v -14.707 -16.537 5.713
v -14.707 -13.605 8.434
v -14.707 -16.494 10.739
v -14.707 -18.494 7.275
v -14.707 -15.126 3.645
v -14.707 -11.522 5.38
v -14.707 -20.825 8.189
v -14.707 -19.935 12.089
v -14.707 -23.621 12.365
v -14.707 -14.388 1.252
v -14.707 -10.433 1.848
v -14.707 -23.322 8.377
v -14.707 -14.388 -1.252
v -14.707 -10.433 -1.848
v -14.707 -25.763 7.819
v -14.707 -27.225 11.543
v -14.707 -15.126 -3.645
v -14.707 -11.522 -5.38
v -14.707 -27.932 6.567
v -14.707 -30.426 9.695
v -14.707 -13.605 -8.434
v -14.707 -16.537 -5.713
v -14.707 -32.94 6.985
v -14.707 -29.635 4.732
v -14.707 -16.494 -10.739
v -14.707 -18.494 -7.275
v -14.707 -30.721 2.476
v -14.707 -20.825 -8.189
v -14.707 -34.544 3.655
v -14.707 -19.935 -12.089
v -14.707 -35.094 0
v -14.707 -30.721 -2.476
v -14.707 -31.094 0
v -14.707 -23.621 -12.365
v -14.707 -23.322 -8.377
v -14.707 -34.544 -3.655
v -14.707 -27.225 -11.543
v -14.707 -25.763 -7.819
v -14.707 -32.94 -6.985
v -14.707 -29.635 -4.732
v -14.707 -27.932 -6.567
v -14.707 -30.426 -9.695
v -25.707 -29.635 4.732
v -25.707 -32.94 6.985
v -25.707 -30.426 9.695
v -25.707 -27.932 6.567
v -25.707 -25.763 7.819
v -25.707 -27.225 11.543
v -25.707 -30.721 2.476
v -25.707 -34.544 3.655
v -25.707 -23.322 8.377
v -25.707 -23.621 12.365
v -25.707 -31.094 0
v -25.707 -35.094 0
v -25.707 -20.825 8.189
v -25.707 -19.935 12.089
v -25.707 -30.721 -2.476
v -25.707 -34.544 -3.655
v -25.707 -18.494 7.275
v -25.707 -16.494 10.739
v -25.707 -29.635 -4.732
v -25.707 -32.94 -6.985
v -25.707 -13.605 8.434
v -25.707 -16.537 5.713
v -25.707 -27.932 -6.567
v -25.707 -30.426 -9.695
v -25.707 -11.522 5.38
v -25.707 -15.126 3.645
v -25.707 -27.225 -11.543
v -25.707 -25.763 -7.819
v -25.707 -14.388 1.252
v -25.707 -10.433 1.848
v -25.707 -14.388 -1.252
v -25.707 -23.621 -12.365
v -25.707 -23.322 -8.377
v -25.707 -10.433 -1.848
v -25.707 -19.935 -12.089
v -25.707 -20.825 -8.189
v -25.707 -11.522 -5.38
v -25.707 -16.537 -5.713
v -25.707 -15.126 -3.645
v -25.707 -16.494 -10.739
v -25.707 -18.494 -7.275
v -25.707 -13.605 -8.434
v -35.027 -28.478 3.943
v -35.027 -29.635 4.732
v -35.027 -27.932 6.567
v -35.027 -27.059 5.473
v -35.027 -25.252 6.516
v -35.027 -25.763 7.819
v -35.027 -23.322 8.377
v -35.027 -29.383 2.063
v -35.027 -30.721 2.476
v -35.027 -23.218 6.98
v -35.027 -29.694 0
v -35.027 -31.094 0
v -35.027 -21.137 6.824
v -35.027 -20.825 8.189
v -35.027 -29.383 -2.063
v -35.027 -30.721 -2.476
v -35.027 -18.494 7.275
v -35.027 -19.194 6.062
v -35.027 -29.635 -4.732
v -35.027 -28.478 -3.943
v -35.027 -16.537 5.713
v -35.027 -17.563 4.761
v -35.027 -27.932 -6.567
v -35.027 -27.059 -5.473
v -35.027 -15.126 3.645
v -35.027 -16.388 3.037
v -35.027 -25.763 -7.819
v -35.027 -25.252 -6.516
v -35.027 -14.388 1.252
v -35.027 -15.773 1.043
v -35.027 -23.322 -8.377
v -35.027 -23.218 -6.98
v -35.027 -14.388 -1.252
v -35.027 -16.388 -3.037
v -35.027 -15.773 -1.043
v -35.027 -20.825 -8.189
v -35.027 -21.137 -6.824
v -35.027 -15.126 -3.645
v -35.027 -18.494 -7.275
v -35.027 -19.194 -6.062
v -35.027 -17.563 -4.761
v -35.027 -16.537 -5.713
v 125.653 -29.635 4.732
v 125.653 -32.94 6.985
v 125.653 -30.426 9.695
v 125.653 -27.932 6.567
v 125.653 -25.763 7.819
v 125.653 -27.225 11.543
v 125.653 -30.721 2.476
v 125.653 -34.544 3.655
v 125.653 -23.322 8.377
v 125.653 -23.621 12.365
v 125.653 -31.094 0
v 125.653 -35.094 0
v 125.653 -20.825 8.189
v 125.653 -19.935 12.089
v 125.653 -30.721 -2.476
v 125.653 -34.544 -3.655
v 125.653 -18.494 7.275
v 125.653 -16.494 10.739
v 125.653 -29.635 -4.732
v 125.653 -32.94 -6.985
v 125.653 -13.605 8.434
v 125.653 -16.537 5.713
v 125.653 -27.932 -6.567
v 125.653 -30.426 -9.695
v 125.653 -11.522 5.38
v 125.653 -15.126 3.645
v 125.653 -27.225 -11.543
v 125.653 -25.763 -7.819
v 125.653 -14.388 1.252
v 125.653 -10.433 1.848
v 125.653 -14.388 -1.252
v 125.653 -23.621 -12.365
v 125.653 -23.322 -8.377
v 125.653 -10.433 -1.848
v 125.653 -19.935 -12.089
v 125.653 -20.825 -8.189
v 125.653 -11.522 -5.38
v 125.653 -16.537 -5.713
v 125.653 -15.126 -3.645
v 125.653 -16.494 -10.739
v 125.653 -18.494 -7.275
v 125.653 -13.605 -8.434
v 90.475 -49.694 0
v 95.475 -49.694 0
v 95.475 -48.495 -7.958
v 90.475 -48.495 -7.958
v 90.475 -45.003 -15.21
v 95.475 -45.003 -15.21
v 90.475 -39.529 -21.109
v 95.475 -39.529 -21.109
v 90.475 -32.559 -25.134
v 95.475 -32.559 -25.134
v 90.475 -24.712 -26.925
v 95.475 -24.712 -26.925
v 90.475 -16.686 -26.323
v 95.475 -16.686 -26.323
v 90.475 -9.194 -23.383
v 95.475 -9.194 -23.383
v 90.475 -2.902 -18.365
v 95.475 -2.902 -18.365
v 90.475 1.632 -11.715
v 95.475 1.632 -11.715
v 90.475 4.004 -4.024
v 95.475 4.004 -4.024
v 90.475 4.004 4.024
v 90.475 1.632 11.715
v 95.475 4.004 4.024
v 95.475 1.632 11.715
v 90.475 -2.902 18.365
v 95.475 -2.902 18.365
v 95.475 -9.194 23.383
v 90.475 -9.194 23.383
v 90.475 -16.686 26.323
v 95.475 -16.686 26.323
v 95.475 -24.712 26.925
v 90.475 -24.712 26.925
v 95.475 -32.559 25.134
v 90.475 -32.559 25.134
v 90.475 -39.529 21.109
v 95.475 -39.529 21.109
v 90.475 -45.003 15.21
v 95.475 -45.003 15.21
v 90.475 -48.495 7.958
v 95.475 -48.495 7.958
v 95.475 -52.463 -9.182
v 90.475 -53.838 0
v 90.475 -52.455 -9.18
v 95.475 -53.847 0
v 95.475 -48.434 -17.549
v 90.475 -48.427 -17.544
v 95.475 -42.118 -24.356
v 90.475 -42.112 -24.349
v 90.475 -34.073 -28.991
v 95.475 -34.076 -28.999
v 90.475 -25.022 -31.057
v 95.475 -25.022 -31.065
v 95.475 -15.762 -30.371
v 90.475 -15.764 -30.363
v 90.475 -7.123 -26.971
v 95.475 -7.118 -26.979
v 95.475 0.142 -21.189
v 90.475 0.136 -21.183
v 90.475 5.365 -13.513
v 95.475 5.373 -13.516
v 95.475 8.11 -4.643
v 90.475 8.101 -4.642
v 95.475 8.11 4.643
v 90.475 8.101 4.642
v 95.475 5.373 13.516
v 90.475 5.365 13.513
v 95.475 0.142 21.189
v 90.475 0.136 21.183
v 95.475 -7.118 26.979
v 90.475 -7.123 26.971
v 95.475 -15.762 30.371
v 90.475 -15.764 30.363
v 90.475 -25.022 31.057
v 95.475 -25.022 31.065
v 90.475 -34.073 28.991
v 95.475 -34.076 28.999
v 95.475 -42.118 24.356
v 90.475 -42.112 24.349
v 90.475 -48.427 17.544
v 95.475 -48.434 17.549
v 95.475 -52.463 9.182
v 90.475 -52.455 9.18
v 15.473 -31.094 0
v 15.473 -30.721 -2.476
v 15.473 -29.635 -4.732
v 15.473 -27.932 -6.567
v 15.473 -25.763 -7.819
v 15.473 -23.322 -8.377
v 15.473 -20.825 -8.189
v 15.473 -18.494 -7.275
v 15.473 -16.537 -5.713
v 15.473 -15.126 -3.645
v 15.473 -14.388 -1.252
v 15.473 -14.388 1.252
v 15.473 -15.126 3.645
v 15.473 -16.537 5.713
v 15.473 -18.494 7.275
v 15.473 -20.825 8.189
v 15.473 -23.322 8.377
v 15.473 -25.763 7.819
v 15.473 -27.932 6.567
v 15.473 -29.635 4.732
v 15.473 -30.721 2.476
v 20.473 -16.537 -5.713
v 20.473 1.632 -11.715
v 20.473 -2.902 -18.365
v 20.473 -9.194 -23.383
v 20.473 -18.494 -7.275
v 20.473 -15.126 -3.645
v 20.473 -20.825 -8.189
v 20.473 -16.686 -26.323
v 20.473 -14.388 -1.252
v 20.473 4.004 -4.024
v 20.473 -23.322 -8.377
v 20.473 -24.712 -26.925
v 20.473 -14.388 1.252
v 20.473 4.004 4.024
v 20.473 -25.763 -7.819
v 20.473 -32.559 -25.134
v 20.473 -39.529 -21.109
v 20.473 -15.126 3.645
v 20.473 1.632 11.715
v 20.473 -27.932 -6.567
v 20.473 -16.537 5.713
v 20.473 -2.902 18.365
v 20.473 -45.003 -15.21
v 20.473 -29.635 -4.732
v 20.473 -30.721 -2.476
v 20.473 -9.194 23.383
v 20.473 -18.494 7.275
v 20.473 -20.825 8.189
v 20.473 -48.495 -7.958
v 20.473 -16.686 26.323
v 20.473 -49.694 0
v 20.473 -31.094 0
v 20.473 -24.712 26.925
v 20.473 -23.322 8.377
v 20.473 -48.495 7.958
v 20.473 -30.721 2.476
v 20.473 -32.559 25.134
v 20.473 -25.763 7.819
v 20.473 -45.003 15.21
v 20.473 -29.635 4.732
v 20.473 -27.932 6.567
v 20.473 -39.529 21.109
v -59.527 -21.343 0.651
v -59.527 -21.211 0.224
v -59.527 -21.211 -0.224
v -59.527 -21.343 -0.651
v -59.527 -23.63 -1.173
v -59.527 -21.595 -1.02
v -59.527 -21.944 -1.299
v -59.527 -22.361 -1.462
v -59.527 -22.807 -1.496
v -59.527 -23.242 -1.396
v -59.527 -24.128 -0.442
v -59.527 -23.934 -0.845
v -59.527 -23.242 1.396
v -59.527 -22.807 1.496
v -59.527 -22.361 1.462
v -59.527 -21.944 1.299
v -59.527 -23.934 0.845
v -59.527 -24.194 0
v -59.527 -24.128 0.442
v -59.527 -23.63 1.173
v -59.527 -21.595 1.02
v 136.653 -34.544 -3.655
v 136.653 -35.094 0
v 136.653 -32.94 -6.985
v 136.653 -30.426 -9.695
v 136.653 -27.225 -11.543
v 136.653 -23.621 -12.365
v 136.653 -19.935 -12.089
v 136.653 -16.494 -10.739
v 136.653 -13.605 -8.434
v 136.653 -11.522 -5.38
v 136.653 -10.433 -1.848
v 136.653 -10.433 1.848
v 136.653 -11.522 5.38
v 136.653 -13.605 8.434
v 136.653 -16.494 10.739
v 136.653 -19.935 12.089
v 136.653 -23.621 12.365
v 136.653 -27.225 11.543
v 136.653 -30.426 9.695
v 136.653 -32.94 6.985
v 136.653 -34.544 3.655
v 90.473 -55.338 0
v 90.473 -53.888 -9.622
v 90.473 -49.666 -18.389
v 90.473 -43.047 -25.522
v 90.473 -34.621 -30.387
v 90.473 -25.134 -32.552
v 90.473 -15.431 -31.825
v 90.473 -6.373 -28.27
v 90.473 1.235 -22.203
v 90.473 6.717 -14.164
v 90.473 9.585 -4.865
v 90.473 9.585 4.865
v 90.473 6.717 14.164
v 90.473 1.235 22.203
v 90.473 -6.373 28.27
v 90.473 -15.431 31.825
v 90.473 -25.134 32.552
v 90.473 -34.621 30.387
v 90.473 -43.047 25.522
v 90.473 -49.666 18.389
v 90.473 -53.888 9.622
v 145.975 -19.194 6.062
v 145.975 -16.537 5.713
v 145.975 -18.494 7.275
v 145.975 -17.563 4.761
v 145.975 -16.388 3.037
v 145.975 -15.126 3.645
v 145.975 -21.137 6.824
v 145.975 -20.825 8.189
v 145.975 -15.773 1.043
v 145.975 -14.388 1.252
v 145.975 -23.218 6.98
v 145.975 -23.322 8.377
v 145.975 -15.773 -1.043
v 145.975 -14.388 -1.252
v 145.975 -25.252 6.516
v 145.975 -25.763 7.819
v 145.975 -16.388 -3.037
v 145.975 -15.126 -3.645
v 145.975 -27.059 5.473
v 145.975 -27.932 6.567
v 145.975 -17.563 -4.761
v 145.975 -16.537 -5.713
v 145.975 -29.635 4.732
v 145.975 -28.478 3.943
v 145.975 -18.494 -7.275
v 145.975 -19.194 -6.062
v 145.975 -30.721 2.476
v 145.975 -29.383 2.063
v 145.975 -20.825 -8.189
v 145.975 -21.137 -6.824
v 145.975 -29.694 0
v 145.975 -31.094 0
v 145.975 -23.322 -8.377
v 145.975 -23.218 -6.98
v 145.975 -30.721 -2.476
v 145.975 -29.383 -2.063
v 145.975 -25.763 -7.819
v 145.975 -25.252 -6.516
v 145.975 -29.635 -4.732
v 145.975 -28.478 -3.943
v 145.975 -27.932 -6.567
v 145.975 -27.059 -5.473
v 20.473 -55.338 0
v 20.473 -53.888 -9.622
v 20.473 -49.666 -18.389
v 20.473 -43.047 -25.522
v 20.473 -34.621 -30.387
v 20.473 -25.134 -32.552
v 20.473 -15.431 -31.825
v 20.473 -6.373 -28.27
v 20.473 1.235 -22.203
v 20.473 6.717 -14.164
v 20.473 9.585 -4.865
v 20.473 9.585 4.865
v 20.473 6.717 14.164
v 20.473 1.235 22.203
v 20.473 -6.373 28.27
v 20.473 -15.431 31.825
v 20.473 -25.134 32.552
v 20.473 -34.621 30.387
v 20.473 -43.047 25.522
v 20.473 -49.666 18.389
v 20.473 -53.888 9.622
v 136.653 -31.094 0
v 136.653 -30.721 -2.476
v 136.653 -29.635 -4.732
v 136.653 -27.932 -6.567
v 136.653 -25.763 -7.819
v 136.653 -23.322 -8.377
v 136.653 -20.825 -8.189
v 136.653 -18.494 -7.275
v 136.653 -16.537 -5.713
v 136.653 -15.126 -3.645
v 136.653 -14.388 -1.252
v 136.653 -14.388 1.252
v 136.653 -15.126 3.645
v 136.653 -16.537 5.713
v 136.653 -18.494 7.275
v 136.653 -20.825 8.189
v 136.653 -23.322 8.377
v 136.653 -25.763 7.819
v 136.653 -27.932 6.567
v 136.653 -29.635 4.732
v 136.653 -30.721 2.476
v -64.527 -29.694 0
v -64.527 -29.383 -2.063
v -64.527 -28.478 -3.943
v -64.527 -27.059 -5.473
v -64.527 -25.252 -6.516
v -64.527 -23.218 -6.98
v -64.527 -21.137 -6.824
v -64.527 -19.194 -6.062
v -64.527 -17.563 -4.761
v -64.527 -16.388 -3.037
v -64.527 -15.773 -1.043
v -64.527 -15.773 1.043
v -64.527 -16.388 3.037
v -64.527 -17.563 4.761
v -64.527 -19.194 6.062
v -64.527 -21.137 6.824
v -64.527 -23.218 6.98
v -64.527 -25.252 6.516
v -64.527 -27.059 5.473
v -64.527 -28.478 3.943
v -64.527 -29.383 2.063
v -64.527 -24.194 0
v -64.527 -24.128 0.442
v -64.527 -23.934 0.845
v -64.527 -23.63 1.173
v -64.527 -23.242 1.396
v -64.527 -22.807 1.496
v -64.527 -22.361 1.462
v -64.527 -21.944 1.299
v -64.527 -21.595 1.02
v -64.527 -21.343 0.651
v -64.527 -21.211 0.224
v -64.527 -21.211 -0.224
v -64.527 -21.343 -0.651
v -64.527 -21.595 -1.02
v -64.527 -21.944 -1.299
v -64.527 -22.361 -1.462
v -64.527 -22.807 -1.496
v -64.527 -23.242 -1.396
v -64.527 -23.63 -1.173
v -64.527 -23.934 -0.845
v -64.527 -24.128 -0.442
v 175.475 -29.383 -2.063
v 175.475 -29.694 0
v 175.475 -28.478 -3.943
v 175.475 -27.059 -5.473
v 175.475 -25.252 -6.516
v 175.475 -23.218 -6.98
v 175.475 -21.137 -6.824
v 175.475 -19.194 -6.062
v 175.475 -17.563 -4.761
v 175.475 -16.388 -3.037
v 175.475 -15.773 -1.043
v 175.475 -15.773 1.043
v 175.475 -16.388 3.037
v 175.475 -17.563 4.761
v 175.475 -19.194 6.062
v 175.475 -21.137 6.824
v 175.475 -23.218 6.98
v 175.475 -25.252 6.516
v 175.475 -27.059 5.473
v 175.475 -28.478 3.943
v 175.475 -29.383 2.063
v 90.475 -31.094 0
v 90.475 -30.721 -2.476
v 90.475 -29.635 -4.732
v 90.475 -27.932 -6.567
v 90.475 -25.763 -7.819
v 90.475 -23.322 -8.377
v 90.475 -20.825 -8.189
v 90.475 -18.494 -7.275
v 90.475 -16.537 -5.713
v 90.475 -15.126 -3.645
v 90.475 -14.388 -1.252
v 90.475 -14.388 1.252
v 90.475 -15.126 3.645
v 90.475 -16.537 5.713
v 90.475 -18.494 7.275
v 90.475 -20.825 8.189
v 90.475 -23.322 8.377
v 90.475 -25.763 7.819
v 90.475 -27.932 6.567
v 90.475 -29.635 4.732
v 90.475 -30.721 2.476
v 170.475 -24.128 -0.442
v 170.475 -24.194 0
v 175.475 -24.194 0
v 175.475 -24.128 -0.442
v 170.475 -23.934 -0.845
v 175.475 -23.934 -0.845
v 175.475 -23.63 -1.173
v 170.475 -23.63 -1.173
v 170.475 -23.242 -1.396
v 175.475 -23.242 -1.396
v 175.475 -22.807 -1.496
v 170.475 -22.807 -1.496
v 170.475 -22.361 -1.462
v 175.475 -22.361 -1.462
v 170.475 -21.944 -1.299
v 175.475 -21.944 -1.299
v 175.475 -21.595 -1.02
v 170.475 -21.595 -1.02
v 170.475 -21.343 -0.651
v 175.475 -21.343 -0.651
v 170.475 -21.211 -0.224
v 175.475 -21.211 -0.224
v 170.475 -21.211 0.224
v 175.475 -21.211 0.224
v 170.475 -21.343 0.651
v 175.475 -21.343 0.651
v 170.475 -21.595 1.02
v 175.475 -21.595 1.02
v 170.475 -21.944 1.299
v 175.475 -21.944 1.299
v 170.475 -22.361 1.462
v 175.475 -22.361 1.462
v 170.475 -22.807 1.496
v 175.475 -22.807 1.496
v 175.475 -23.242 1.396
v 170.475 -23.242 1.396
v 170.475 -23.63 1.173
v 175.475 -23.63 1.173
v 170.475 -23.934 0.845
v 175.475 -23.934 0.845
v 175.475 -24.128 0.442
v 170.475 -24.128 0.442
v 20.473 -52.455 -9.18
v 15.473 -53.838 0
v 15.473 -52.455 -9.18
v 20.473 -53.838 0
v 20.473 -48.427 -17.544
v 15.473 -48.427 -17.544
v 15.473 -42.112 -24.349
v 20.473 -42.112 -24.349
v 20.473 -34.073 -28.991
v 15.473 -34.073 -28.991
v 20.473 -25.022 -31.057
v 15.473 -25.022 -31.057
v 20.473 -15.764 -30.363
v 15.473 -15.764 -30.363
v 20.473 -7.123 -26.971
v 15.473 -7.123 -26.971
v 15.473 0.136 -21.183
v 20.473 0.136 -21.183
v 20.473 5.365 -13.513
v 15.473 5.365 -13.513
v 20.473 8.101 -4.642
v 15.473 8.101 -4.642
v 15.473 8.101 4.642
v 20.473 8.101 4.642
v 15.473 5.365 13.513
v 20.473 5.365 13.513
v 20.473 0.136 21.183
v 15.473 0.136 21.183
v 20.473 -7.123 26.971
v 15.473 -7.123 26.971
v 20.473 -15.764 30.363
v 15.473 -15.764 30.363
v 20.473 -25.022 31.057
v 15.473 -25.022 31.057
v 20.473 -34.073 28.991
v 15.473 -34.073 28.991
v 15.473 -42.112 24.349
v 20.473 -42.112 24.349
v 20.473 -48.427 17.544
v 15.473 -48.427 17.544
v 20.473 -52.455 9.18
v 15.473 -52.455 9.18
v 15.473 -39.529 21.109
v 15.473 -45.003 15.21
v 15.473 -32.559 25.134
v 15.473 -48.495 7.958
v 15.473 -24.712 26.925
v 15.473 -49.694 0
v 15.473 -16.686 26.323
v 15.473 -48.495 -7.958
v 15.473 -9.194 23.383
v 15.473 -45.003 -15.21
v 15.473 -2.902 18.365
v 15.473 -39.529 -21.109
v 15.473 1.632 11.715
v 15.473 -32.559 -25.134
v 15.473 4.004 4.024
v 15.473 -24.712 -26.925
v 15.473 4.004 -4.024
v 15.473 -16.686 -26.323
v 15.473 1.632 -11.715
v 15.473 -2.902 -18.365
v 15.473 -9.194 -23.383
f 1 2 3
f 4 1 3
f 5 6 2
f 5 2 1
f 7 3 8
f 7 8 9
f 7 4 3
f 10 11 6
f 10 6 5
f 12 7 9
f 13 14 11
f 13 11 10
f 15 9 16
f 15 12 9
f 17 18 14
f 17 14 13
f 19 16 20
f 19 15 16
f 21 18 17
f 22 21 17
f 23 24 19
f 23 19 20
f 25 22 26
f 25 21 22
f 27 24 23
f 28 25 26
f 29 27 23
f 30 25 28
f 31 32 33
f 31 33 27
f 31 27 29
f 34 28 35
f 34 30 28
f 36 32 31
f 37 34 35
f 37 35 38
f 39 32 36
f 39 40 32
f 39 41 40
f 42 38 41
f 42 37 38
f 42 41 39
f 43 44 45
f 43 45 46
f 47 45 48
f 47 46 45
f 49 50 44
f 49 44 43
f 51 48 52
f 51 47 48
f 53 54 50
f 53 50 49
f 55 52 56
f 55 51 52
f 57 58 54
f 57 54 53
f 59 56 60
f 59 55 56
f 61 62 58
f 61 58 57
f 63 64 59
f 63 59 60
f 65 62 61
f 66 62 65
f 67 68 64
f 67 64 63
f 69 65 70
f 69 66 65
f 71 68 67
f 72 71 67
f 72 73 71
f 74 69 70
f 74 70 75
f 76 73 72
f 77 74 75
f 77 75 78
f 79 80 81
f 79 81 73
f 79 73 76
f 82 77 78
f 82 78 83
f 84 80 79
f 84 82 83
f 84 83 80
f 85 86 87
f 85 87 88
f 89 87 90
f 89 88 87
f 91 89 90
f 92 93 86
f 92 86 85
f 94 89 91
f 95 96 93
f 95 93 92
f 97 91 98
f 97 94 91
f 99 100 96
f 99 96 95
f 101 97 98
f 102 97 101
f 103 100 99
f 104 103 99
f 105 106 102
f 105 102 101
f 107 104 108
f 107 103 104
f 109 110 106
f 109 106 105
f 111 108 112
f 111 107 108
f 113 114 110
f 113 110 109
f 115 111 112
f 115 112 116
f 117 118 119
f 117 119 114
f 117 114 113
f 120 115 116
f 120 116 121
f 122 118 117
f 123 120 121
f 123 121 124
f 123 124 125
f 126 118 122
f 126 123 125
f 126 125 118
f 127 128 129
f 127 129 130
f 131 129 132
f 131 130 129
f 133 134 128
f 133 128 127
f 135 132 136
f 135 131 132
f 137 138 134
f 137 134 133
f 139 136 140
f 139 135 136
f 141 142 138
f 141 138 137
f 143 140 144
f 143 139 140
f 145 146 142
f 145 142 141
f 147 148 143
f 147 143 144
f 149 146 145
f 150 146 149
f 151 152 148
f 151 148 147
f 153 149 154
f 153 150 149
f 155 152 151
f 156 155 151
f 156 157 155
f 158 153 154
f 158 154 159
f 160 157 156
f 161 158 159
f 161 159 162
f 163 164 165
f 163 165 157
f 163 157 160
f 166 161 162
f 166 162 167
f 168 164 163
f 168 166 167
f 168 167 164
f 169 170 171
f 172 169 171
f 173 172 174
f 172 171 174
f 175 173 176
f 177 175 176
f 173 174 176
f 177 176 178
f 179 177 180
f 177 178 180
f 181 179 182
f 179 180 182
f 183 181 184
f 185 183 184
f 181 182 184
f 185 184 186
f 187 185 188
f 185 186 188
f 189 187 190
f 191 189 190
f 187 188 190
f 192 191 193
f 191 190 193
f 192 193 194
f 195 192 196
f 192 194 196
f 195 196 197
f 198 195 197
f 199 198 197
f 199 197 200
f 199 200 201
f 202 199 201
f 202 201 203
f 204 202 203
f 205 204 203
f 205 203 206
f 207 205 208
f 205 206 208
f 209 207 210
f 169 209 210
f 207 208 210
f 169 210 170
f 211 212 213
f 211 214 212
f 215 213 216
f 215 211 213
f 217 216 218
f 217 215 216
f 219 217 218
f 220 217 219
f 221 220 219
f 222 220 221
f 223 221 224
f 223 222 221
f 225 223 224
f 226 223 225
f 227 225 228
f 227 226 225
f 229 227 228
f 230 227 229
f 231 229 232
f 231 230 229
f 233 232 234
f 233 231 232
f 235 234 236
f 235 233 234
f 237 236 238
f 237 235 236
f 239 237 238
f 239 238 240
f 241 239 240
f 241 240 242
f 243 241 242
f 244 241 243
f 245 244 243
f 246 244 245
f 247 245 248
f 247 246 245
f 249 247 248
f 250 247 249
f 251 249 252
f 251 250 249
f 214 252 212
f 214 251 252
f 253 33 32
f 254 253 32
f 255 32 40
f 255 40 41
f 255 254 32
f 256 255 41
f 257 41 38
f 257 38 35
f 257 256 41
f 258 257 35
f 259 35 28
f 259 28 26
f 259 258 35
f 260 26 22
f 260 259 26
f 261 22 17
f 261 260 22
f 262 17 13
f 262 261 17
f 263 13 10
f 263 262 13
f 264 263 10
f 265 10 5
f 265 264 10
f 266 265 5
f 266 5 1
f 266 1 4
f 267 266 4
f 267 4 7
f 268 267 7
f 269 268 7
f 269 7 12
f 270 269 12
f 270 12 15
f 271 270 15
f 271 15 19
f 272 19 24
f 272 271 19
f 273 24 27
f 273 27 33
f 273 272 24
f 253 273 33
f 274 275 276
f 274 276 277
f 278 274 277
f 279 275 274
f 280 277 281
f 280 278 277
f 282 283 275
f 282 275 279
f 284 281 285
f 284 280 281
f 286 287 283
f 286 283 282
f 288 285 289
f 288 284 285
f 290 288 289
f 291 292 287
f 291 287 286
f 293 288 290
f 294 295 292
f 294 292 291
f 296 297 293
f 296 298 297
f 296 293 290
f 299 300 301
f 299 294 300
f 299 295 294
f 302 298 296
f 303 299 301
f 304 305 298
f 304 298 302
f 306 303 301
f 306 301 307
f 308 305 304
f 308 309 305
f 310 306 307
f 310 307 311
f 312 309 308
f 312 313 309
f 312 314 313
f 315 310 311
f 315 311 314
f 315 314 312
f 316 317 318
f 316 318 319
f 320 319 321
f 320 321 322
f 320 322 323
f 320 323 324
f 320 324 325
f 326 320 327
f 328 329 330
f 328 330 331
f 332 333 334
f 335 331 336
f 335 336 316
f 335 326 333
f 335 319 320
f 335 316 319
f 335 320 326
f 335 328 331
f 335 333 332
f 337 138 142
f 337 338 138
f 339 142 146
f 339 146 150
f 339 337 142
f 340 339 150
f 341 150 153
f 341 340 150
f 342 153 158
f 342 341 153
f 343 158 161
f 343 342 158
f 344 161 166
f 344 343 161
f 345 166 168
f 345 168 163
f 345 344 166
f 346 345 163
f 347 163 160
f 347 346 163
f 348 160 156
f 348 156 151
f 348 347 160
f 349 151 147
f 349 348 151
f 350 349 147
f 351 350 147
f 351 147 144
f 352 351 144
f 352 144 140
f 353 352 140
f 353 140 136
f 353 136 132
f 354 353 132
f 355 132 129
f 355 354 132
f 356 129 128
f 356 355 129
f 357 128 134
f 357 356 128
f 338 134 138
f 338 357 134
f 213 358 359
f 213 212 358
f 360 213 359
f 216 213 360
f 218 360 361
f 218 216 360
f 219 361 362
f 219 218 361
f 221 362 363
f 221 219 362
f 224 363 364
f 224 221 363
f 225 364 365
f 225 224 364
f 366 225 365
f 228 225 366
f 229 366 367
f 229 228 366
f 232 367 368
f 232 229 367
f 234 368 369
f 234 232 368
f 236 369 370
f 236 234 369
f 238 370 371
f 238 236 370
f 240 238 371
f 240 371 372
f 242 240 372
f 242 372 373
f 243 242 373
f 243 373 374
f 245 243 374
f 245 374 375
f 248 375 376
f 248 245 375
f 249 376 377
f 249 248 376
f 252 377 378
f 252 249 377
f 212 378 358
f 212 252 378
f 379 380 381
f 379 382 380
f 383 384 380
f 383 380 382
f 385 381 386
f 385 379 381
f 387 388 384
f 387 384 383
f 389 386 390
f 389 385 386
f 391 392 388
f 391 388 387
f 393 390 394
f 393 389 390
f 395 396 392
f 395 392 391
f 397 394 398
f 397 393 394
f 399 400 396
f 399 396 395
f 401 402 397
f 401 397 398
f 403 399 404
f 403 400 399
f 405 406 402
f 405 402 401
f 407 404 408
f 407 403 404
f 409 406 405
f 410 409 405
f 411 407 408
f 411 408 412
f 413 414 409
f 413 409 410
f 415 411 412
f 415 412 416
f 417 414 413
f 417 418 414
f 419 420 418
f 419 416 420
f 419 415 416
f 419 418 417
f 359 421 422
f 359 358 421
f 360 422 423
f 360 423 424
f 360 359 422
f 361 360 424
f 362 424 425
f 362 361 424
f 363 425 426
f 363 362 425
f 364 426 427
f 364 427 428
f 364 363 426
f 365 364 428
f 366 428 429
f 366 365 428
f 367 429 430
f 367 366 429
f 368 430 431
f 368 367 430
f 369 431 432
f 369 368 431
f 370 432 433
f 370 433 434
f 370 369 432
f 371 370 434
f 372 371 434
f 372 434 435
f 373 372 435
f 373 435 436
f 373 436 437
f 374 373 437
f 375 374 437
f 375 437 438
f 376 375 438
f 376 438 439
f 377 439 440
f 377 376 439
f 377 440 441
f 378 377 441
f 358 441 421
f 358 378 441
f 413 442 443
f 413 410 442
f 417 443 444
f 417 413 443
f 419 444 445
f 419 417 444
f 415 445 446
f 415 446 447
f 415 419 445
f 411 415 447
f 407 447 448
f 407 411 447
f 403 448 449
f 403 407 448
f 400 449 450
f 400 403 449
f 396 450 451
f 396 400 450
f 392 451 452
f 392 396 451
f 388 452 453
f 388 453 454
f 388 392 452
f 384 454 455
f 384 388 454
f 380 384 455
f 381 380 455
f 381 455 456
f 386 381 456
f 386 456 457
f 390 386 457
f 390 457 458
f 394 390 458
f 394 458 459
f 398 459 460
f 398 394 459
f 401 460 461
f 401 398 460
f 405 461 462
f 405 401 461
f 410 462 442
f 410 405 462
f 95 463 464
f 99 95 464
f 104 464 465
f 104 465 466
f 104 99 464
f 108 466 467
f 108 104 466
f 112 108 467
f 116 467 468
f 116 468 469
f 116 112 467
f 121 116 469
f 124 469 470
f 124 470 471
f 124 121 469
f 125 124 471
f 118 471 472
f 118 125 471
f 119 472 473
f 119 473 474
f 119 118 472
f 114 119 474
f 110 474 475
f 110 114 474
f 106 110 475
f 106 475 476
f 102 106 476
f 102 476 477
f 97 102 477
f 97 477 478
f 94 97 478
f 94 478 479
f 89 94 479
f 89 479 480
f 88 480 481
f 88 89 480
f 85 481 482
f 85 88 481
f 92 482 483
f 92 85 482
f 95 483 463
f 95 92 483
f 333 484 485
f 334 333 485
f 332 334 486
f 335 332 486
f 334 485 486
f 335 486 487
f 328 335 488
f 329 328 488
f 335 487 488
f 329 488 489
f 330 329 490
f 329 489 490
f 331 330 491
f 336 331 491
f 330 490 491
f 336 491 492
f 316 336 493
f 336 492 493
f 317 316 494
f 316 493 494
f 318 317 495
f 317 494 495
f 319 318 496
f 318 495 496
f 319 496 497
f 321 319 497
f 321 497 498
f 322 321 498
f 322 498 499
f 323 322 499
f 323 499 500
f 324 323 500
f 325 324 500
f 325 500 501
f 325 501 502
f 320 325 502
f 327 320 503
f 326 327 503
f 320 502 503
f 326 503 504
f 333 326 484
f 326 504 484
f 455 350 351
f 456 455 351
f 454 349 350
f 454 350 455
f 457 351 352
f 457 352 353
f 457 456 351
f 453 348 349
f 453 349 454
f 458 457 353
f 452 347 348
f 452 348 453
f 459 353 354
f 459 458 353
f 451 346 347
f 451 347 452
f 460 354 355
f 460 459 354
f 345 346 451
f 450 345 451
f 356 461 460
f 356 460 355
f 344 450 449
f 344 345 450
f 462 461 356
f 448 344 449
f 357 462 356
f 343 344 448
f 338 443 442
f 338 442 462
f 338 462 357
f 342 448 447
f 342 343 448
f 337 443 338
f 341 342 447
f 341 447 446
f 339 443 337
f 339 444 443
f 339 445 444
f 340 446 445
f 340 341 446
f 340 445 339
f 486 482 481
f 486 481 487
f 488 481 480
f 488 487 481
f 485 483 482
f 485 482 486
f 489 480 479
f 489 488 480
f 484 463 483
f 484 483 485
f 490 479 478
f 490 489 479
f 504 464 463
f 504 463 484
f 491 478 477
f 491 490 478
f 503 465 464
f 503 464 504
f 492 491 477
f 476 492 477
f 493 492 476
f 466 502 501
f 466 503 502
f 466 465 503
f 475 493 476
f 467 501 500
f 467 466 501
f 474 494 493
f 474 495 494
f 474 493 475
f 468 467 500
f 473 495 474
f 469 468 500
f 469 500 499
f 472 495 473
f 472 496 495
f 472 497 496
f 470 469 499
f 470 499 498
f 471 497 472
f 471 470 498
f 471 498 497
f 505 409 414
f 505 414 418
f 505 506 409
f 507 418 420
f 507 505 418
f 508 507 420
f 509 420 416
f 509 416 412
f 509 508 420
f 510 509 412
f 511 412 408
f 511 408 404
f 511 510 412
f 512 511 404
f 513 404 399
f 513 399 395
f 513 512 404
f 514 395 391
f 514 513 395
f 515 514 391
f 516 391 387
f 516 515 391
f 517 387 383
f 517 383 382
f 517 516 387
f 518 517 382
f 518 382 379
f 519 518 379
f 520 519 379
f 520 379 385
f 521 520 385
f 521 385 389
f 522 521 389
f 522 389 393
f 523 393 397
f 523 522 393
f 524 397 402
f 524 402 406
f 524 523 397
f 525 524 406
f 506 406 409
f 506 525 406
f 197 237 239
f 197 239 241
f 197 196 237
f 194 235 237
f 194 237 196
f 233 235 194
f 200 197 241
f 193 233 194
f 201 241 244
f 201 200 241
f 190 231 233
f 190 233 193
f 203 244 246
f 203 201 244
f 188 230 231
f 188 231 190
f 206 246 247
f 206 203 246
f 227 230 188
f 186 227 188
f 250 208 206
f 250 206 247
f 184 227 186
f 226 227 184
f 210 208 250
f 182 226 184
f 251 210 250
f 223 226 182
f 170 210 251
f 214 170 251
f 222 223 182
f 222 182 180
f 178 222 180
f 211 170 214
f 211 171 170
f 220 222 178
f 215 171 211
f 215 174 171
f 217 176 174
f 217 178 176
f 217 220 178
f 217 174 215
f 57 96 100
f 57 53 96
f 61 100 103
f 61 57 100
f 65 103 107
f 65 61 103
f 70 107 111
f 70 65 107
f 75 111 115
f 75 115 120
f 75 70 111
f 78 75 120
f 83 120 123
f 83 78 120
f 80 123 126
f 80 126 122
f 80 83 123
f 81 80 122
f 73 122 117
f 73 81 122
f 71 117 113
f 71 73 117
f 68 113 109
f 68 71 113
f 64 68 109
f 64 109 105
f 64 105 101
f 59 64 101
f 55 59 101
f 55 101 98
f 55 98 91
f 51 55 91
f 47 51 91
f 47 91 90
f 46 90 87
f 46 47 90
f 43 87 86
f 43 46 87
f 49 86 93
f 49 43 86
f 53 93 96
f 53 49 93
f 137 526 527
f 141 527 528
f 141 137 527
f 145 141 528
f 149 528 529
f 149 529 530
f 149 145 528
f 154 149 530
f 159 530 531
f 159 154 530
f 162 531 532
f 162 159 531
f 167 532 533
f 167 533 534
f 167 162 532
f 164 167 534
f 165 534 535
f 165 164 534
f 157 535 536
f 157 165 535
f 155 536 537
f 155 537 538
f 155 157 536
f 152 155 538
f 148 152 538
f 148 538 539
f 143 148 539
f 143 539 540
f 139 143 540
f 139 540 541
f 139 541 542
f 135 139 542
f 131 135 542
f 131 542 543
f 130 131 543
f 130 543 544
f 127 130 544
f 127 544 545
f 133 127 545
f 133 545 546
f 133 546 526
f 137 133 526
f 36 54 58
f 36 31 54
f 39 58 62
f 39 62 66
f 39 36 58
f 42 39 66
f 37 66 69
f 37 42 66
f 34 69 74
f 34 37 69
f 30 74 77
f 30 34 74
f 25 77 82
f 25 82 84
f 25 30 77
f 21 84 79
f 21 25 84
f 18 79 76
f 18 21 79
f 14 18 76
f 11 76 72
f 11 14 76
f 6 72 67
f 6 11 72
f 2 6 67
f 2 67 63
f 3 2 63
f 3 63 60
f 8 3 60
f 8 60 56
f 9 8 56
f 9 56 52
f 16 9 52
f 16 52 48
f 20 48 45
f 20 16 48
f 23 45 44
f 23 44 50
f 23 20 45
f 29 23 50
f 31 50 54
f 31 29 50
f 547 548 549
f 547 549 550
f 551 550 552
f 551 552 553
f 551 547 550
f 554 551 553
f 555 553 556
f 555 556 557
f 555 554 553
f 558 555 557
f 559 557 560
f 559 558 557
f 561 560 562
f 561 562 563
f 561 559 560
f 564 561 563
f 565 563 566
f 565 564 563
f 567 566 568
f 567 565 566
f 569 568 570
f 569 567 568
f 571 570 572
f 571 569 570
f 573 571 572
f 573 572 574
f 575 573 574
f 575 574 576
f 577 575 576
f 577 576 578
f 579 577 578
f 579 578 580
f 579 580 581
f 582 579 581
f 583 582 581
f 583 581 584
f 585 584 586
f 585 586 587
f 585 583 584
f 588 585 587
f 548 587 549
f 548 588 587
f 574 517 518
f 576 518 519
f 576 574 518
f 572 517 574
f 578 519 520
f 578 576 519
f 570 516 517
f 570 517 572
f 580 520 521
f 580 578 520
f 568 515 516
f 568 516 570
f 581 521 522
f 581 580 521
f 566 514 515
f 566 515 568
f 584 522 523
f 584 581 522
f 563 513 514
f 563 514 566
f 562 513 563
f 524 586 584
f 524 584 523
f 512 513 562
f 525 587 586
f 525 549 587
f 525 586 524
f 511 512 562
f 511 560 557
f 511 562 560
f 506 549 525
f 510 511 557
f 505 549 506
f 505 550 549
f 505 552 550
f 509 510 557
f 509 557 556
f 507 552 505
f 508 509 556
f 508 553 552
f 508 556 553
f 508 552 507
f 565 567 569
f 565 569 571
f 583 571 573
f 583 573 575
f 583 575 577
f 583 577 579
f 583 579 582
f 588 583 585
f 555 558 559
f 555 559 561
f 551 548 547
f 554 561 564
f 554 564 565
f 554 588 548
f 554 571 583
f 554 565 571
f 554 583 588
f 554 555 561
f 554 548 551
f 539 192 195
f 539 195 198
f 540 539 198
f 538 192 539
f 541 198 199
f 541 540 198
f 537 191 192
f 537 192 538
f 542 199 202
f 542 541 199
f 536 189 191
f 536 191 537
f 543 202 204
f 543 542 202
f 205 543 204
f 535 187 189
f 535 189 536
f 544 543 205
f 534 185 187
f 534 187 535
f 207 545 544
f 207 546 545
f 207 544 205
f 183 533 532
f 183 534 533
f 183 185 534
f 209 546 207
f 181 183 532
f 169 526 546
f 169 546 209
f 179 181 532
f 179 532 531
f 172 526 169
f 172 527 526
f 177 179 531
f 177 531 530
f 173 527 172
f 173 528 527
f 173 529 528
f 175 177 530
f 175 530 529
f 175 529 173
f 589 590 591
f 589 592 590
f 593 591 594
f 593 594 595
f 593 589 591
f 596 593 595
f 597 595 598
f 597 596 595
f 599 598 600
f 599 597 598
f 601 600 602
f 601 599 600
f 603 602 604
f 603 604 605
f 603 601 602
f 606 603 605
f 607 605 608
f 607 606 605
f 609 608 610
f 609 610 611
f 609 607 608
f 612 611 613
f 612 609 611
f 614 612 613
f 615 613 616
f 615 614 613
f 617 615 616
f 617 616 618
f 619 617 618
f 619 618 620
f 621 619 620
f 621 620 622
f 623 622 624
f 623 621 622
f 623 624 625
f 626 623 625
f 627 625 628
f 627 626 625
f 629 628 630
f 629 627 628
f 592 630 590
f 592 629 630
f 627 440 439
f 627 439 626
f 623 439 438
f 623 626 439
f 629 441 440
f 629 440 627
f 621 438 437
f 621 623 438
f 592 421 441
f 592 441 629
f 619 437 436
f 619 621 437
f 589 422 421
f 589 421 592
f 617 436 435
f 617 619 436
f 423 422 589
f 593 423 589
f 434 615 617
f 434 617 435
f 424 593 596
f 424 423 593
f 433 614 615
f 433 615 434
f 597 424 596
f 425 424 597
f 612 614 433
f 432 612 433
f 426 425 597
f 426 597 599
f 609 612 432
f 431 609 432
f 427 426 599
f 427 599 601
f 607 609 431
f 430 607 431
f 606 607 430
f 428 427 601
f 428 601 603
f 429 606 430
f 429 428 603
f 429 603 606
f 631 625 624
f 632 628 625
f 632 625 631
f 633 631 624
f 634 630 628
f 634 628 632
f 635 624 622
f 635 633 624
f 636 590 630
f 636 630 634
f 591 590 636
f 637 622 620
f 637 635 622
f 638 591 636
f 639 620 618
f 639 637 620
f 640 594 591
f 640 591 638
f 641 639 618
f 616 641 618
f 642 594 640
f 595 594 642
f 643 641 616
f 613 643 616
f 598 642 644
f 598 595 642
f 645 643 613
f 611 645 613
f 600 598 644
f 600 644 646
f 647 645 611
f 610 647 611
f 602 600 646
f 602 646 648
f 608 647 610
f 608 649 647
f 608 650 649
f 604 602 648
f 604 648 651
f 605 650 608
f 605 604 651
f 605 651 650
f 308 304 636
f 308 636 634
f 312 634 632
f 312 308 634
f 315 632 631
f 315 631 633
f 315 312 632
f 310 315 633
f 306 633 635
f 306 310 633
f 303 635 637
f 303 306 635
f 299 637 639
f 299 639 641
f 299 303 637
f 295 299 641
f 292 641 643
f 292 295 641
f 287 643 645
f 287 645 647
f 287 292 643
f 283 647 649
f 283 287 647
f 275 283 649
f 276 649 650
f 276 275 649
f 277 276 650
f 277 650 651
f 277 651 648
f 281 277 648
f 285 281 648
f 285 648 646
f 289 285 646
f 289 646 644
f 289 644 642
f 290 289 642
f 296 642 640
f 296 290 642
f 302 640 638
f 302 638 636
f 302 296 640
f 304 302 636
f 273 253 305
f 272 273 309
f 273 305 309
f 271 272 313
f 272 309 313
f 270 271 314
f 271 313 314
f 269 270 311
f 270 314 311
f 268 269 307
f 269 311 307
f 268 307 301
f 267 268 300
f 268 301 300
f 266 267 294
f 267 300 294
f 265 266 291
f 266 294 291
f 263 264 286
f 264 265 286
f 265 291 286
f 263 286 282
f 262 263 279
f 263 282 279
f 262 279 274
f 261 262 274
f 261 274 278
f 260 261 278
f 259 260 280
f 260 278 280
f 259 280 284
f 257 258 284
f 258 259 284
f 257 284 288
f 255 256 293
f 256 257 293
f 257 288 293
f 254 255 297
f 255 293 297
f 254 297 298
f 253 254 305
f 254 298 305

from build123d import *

# Parameters (mm, degrees)
CUT_EXTRUDE1_START = -5
SKETCH2_R          = 27
SKETCH2_R_2        = 8.4
CUT_EXTRUDE1_DEPTH = 5
SKETCH3_R          = 27
SKETCH3_R_2        = 8.4
CUT_EXTRUDE2_DEPTH = 5
SKETCH4_R          = 1.5
CUT_EXTRUDE3_DEPTH = 5
CUT_EXTRUDE4_START = -5
SKETCH6_R          = 1.5
CUT_EXTRUDE4_DEPTH = 5


with BuildPart() as part:
    # Sketch1 → Revolve1 (revolve)
    with BuildSketch(Plane.XY, mode=Mode.PRIVATE) as revolve1_sk:
        Polygon((136.652683421, -10.294425689), (136.652683421, -14.294425689), (145.975223156, -14.294425689), (145.975223156, -15.694425689), (175.475223156, -15.694425689), (175.475223156, -22.694425689), (-64.527316579, -22.694425689), (-64.527316579, -15.694425689), (-35.027316579, -15.694425689), (-35.027316579, -14.294425689), (-25.707316579, -14.294425689), (-25.707316579, -10.294425689), (-14.707316579, -10.294425689), (-14.707316579, -14.294425689), (15.472683421, -14.294425689), (15.472683421, 8.449285256), (20.472683421, 8.449285256), (20.472683421, 9.949285256), (90.472683421, 9.949285256), (90.475230364, 8.449287418), (95.475223156, 8.457777227), (95.475223156, -14.294425689), (125.652683421, -14.294425689), (125.652683421, -10.294425689), align=None)
    revolve(revolve1_sk.sketch.rotate(Axis((-64.527316579, -22.694425689, 0), (1, 0, 0)), 180), axis=Axis((-64.527316579, -22.694425689, 0), (1, 0, 0)))

    # Sketch2 → Cut-Extrude1 (cut)
    with BuildSketch(Plane.ZY.offset(-15.472683421).offset(CUT_EXTRUDE1_START)):
        with Locations(Location((0, -22.694425689, 0), (0, 0, 270))):
            Circle(SKETCH2_R)
        with Locations(Location((0, -22.694425689, 0), (0, 0, 270))):
            Circle(SKETCH2_R_2, mode=Mode.SUBTRACT)
    extrude(amount=CUT_EXTRUDE1_DEPTH, mode=Mode.SUBTRACT)

    # Sketch3 → Cut-Extrude2 (cut)
    with BuildSketch(Plane(origin=(95.475223156, 0, 0), x_dir=(0, 0, -1), z_dir=(1, 0, 0))):
        with Locations(Location((0, -22.694425689, 0), (0, 0, 270))):
            Circle(SKETCH3_R)
        with Locations(Location((0, -22.694425689, 0), (0, 0, 270))):
            Circle(SKETCH3_R_2, mode=Mode.SUBTRACT)
    extrude(amount=-CUT_EXTRUDE2_DEPTH, mode=Mode.SUBTRACT)

    # Sketch4 → Cut-Extrude3 (cut)
    with BuildSketch(Plane.ZY.offset(64.527316579)):
        with Locations(Location((0, -22.694425689, 0), (0, 0, 270))):
            Circle(SKETCH4_R)
    extrude(amount=-CUT_EXTRUDE3_DEPTH, mode=Mode.SUBTRACT)

    # Sketch6 → Cut-Extrude4 (cut)
    with BuildSketch(Plane(origin=(175.475223156, 0, 0), x_dir=(0, 0, -1), z_dir=(1, 0, 0)).offset(CUT_EXTRUDE4_START)):
        with Locations(Location((0, -22.694425689, 0), (0, 0, 270))):
            Circle(SKETCH6_R)
    extrude(amount=CUT_EXTRUDE4_DEPTH, mode=Mode.SUBTRACT)


solid = part.part
